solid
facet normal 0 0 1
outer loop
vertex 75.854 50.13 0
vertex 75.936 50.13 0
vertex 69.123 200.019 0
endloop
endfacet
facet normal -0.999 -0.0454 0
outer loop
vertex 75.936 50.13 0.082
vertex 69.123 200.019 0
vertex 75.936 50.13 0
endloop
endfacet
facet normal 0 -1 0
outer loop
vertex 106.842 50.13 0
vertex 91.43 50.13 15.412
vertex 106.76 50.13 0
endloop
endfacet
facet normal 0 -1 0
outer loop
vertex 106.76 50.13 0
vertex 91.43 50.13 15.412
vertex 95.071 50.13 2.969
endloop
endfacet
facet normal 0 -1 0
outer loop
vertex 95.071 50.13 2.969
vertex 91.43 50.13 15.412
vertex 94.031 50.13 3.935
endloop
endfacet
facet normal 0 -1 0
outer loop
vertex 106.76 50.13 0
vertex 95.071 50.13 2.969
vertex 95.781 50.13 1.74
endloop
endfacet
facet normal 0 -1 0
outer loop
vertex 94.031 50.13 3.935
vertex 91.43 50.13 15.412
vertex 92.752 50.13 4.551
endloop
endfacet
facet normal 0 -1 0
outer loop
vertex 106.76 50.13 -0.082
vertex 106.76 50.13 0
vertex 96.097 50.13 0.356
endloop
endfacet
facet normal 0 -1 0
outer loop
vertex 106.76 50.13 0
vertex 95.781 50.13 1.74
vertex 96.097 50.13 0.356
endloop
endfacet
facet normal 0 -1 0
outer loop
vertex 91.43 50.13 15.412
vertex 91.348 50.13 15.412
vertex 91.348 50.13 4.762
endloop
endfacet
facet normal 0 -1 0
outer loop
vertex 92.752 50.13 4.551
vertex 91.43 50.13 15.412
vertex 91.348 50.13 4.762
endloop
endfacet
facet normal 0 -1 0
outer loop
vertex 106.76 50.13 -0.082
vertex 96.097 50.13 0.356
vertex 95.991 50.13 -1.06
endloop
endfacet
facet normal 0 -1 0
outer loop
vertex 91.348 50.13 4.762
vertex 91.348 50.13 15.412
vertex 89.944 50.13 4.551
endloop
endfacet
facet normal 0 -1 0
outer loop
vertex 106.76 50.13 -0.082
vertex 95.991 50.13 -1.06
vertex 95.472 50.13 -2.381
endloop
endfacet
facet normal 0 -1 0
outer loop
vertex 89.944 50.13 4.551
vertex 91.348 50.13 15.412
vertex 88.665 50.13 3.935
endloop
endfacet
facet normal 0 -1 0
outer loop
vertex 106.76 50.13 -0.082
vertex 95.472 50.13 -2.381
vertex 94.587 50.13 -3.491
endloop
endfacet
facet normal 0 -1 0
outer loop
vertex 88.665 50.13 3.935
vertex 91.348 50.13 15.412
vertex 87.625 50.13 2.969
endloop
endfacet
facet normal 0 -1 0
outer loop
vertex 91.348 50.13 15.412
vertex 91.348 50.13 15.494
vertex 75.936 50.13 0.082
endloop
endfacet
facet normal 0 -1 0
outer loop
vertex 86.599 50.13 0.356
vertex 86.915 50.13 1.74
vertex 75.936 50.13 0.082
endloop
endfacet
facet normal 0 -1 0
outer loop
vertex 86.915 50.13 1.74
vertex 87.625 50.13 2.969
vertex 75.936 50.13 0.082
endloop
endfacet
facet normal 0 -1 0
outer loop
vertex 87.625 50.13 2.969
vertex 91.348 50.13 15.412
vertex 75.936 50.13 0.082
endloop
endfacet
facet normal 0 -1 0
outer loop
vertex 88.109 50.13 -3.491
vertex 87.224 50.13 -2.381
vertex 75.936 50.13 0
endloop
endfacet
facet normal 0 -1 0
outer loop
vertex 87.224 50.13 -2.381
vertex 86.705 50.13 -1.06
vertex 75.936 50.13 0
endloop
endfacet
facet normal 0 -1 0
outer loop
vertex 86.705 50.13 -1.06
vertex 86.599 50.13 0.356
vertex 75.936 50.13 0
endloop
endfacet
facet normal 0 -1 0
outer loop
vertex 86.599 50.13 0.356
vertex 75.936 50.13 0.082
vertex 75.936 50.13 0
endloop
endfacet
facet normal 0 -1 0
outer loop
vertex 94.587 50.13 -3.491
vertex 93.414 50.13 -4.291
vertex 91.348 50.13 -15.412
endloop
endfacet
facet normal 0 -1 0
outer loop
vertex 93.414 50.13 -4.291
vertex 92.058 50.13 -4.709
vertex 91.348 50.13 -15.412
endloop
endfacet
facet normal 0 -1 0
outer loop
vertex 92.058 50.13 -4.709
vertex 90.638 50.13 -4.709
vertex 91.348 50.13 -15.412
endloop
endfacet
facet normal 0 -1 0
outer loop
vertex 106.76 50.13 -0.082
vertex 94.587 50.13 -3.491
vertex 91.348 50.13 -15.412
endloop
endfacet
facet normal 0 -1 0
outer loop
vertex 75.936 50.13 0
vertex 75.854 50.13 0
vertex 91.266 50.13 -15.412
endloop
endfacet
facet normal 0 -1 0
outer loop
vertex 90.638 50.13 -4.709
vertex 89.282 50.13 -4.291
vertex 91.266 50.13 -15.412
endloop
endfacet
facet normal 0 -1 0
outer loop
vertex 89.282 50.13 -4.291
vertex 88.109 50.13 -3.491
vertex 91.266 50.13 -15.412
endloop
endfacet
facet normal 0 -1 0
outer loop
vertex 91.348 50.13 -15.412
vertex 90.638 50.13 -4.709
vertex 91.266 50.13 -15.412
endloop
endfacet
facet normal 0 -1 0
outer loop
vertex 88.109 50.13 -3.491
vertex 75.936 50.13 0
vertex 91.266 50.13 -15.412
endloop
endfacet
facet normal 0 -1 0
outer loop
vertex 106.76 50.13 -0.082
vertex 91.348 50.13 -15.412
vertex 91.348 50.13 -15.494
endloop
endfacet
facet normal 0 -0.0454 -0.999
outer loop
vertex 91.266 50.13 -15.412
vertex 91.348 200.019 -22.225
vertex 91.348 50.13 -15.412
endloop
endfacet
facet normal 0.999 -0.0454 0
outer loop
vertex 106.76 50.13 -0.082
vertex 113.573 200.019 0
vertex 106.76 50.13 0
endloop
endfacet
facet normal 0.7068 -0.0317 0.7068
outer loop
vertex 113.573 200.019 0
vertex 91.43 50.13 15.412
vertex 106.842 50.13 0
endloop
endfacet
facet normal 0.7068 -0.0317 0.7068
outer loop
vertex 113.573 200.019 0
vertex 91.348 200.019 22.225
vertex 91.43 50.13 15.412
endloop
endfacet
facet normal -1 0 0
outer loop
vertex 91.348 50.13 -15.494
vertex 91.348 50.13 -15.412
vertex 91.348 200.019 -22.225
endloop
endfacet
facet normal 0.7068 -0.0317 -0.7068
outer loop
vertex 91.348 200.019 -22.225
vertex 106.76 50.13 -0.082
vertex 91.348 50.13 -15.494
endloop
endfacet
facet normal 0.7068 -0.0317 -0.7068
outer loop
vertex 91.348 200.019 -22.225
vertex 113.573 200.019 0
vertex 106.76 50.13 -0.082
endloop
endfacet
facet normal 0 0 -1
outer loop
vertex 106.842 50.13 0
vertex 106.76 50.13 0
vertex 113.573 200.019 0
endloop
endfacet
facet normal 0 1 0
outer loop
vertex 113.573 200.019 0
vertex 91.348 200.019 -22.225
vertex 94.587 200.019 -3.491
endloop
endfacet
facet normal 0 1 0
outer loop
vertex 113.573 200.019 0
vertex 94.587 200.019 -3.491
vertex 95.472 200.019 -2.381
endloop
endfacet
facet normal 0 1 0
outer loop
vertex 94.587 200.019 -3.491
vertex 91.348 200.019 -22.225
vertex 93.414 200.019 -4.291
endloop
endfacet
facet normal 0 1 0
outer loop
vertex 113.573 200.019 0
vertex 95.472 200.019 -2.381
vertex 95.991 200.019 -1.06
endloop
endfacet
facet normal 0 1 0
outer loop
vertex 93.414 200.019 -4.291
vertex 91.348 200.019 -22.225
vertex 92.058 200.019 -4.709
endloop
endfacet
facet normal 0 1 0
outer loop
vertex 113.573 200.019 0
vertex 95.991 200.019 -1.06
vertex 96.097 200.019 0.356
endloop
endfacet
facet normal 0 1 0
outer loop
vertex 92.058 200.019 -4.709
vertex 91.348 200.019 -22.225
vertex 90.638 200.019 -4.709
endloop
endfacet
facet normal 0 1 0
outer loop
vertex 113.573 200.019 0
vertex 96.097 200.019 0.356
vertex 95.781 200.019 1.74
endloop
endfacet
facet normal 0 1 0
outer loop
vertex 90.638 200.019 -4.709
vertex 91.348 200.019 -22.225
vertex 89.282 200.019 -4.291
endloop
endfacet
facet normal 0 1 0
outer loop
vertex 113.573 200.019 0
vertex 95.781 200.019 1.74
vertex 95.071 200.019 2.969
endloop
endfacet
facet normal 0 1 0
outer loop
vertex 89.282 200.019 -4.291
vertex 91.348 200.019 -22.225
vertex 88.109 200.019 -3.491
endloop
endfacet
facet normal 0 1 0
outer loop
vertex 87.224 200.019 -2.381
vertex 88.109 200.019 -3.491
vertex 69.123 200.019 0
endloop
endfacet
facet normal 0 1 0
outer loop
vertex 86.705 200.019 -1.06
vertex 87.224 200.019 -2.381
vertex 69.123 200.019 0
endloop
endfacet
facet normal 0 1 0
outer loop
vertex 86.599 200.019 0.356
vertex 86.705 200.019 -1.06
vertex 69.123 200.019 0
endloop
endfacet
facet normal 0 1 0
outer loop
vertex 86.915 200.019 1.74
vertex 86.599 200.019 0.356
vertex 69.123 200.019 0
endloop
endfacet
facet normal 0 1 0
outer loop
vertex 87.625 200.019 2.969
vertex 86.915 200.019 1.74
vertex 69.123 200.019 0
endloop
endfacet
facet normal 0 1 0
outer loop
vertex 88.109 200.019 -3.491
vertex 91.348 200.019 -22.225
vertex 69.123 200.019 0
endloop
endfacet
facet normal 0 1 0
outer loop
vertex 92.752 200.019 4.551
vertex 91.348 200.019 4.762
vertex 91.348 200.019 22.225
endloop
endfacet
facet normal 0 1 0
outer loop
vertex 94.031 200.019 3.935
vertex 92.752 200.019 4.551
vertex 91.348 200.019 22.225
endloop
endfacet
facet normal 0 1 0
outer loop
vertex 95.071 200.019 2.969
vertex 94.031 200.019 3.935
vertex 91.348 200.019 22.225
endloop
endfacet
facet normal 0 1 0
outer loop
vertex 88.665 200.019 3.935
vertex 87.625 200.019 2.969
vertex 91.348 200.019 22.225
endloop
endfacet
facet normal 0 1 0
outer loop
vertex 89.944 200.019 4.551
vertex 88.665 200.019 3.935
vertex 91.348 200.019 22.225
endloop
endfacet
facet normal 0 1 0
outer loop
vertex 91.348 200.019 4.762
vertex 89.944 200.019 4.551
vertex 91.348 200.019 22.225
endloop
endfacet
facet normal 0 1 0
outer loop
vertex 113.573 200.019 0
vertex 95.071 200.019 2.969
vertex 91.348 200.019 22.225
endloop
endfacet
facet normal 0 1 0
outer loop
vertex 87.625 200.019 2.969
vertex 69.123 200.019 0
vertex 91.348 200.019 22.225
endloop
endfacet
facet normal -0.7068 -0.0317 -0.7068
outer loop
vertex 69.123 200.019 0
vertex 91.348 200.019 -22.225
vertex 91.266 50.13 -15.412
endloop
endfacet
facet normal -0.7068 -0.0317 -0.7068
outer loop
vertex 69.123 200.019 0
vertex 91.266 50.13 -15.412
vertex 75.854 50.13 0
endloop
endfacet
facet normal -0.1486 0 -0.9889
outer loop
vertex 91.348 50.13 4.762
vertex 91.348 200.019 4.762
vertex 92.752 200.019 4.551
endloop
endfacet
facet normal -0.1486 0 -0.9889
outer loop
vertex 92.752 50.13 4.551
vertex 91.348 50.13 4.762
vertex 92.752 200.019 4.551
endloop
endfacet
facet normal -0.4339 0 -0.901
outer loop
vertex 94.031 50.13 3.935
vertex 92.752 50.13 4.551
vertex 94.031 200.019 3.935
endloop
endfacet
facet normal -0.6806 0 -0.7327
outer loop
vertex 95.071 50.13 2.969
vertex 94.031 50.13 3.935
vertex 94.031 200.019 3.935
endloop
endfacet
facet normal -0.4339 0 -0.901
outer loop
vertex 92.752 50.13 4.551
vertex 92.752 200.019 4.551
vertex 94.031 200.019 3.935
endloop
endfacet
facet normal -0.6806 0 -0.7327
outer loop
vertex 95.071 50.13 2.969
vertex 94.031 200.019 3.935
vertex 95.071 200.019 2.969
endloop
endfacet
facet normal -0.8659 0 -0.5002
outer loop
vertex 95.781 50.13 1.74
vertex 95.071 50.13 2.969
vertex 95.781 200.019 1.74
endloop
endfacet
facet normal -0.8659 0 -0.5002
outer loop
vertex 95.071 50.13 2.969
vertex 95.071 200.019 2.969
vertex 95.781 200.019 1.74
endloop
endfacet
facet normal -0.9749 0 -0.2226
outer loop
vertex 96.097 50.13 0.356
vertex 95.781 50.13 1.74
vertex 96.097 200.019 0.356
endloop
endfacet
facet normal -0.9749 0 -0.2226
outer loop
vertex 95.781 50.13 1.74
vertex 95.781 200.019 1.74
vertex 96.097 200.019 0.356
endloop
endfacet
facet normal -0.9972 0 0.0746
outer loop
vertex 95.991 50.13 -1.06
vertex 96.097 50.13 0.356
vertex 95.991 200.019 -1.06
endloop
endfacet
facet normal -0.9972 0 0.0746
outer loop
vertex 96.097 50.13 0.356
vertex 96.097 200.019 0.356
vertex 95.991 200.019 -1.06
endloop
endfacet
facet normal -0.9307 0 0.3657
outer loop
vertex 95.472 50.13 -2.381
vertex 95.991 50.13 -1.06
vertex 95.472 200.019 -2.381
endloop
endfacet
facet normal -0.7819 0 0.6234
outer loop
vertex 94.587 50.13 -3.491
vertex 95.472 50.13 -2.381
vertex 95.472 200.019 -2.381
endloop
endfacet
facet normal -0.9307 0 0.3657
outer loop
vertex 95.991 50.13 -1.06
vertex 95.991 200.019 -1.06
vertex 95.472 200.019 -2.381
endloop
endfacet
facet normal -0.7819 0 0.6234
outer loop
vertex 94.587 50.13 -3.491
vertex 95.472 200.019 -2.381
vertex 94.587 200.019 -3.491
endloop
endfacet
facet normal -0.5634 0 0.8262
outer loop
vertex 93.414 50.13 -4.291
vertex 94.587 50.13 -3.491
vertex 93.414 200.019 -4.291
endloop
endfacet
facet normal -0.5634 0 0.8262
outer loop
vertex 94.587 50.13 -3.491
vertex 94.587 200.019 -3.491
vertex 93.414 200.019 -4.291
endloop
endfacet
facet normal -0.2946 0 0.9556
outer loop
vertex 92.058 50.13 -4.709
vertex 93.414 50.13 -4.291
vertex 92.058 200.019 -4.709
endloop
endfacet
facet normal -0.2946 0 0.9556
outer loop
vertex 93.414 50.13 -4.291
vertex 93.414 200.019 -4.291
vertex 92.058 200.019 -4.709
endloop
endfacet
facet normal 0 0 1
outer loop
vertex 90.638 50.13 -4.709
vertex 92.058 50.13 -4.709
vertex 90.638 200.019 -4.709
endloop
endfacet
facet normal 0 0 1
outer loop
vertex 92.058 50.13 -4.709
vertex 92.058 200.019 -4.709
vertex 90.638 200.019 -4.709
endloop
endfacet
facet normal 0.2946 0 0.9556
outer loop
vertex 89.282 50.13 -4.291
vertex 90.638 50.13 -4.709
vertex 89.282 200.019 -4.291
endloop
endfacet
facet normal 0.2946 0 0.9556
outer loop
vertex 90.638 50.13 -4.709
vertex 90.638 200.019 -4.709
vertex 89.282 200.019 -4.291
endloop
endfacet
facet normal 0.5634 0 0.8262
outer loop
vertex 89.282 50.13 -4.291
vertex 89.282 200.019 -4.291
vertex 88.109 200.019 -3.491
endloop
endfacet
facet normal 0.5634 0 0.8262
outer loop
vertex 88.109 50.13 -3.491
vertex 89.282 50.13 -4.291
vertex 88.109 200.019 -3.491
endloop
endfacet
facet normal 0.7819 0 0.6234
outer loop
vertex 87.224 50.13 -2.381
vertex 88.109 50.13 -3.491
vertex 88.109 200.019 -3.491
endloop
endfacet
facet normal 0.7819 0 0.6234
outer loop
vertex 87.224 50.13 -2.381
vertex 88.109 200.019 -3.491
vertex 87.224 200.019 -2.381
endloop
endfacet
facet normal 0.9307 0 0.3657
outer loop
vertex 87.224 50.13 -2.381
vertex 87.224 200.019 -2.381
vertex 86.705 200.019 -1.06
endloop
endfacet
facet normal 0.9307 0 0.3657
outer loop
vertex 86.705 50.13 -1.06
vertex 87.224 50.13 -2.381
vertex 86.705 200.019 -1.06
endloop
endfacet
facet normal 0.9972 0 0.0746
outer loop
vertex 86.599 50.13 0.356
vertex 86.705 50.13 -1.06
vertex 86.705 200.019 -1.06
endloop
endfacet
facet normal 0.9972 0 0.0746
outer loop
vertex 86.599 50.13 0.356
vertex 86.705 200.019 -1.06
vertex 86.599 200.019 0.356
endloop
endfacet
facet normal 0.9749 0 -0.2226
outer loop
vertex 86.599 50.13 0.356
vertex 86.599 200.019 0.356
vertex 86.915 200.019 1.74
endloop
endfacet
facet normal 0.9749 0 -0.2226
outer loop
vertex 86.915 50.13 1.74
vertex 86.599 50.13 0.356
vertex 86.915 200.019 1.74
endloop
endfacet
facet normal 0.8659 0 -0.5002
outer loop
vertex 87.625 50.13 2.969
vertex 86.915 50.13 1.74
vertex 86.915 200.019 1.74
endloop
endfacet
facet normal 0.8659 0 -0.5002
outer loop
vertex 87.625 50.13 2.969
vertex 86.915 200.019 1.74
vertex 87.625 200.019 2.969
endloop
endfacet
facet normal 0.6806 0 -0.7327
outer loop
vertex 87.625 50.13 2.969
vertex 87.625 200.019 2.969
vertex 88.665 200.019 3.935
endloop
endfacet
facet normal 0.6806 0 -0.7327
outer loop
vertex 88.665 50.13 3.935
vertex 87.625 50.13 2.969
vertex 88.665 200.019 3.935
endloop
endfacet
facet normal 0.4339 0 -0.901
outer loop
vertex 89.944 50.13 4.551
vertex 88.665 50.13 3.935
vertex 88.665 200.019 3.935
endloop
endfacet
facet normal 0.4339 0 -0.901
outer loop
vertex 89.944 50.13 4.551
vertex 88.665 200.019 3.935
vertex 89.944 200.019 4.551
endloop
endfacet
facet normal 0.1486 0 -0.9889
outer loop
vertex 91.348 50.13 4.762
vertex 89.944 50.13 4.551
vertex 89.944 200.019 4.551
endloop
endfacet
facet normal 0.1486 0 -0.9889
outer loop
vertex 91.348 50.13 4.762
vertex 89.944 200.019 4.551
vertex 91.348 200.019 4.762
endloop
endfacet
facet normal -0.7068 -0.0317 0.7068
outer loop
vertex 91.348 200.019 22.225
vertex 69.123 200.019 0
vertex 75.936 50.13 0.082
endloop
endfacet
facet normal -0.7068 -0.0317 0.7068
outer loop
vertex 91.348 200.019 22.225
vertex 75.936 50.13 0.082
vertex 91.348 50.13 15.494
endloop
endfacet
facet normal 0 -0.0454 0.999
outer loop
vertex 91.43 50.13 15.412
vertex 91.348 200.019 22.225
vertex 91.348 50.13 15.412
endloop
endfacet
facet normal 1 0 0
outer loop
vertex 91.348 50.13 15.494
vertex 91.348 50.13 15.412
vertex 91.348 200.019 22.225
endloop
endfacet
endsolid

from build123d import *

# Parameters (mm, degrees)
BOSS_EXTRUDE1_DEPTH = 22.225
SKETCH4_W           = 42.895640362
SKETCH4_H           = 166.52307566
CUT_EXTRUDE2_DEPTH  = 22.225
CIRPATTERN1_COUNT   = 4
SKETCH5_R           = 4.7625
CUT_EXTRUDE3_DEPTH  = 190.365652901


with BuildPart() as part:
    # Sketch1 → Boss-Extrude1 (new body)
    with BuildSketch(Plane.XY):
        Polygon((75.93611291, 50.130135743), (91.347997502, 50.130135743), (91.347997502, 200.018674704), (69.122997502, 200.018674704), align=None)
    boss_extrude1 = extrude(amount=BOSS_EXTRUDE1_DEPTH)

    # Sketch4 → Cut-Extrude2 (cut)
    with BuildSketch(Plane(origin=(39.013250999, 1.751956449, -39.013250999), x_dir=(0.7060390157604001, 0.031705883905462015, 0.7074628224506635), z_dir=(-0.7067505605587739, -0.03173783703590832, 0.7067505605587739))):
        with Locations((68.323098286, 123.218808293)):
            Rectangle(SKETCH4_W, SKETCH4_H)
    cut_extrude2 = extrude(amount=CUT_EXTRUDE2_DEPTH, mode=Mode.SUBTRACT)

    # CirPattern1: Boss-Extrude1, Cut-Extrude2 ×4 about axis
    cirpattern1_axis = Axis((91.347997502, 0, 0), (0, 1, 0))
    add([boss_extrude1.rotate(cirpattern1_axis, i * 360 / CIRPATTERN1_COUNT) for i in range(1, CIRPATTERN1_COUNT)])
    add([cut_extrude2.rotate(cirpattern1_axis, i * 360 / CIRPATTERN1_COUNT) for i in range(1, CIRPATTERN1_COUNT)], mode=Mode.SUBTRACT)

    # Sketch5 → Cut-Extrude3 (cut, through all)
    with BuildSketch(Plane(origin=(0, 200.018674704, 0), x_dir=(1, 0, 0), z_dir=(0, 1, 0))):
        with Locations(Location((91.347997502, 0, 0), (0, 0, 270))):
            Circle(SKETCH5_R)
    extrude(amount=-CUT_EXTRUDE3_DEPTH, mode=Mode.SUBTRACT)


solid = part.part
